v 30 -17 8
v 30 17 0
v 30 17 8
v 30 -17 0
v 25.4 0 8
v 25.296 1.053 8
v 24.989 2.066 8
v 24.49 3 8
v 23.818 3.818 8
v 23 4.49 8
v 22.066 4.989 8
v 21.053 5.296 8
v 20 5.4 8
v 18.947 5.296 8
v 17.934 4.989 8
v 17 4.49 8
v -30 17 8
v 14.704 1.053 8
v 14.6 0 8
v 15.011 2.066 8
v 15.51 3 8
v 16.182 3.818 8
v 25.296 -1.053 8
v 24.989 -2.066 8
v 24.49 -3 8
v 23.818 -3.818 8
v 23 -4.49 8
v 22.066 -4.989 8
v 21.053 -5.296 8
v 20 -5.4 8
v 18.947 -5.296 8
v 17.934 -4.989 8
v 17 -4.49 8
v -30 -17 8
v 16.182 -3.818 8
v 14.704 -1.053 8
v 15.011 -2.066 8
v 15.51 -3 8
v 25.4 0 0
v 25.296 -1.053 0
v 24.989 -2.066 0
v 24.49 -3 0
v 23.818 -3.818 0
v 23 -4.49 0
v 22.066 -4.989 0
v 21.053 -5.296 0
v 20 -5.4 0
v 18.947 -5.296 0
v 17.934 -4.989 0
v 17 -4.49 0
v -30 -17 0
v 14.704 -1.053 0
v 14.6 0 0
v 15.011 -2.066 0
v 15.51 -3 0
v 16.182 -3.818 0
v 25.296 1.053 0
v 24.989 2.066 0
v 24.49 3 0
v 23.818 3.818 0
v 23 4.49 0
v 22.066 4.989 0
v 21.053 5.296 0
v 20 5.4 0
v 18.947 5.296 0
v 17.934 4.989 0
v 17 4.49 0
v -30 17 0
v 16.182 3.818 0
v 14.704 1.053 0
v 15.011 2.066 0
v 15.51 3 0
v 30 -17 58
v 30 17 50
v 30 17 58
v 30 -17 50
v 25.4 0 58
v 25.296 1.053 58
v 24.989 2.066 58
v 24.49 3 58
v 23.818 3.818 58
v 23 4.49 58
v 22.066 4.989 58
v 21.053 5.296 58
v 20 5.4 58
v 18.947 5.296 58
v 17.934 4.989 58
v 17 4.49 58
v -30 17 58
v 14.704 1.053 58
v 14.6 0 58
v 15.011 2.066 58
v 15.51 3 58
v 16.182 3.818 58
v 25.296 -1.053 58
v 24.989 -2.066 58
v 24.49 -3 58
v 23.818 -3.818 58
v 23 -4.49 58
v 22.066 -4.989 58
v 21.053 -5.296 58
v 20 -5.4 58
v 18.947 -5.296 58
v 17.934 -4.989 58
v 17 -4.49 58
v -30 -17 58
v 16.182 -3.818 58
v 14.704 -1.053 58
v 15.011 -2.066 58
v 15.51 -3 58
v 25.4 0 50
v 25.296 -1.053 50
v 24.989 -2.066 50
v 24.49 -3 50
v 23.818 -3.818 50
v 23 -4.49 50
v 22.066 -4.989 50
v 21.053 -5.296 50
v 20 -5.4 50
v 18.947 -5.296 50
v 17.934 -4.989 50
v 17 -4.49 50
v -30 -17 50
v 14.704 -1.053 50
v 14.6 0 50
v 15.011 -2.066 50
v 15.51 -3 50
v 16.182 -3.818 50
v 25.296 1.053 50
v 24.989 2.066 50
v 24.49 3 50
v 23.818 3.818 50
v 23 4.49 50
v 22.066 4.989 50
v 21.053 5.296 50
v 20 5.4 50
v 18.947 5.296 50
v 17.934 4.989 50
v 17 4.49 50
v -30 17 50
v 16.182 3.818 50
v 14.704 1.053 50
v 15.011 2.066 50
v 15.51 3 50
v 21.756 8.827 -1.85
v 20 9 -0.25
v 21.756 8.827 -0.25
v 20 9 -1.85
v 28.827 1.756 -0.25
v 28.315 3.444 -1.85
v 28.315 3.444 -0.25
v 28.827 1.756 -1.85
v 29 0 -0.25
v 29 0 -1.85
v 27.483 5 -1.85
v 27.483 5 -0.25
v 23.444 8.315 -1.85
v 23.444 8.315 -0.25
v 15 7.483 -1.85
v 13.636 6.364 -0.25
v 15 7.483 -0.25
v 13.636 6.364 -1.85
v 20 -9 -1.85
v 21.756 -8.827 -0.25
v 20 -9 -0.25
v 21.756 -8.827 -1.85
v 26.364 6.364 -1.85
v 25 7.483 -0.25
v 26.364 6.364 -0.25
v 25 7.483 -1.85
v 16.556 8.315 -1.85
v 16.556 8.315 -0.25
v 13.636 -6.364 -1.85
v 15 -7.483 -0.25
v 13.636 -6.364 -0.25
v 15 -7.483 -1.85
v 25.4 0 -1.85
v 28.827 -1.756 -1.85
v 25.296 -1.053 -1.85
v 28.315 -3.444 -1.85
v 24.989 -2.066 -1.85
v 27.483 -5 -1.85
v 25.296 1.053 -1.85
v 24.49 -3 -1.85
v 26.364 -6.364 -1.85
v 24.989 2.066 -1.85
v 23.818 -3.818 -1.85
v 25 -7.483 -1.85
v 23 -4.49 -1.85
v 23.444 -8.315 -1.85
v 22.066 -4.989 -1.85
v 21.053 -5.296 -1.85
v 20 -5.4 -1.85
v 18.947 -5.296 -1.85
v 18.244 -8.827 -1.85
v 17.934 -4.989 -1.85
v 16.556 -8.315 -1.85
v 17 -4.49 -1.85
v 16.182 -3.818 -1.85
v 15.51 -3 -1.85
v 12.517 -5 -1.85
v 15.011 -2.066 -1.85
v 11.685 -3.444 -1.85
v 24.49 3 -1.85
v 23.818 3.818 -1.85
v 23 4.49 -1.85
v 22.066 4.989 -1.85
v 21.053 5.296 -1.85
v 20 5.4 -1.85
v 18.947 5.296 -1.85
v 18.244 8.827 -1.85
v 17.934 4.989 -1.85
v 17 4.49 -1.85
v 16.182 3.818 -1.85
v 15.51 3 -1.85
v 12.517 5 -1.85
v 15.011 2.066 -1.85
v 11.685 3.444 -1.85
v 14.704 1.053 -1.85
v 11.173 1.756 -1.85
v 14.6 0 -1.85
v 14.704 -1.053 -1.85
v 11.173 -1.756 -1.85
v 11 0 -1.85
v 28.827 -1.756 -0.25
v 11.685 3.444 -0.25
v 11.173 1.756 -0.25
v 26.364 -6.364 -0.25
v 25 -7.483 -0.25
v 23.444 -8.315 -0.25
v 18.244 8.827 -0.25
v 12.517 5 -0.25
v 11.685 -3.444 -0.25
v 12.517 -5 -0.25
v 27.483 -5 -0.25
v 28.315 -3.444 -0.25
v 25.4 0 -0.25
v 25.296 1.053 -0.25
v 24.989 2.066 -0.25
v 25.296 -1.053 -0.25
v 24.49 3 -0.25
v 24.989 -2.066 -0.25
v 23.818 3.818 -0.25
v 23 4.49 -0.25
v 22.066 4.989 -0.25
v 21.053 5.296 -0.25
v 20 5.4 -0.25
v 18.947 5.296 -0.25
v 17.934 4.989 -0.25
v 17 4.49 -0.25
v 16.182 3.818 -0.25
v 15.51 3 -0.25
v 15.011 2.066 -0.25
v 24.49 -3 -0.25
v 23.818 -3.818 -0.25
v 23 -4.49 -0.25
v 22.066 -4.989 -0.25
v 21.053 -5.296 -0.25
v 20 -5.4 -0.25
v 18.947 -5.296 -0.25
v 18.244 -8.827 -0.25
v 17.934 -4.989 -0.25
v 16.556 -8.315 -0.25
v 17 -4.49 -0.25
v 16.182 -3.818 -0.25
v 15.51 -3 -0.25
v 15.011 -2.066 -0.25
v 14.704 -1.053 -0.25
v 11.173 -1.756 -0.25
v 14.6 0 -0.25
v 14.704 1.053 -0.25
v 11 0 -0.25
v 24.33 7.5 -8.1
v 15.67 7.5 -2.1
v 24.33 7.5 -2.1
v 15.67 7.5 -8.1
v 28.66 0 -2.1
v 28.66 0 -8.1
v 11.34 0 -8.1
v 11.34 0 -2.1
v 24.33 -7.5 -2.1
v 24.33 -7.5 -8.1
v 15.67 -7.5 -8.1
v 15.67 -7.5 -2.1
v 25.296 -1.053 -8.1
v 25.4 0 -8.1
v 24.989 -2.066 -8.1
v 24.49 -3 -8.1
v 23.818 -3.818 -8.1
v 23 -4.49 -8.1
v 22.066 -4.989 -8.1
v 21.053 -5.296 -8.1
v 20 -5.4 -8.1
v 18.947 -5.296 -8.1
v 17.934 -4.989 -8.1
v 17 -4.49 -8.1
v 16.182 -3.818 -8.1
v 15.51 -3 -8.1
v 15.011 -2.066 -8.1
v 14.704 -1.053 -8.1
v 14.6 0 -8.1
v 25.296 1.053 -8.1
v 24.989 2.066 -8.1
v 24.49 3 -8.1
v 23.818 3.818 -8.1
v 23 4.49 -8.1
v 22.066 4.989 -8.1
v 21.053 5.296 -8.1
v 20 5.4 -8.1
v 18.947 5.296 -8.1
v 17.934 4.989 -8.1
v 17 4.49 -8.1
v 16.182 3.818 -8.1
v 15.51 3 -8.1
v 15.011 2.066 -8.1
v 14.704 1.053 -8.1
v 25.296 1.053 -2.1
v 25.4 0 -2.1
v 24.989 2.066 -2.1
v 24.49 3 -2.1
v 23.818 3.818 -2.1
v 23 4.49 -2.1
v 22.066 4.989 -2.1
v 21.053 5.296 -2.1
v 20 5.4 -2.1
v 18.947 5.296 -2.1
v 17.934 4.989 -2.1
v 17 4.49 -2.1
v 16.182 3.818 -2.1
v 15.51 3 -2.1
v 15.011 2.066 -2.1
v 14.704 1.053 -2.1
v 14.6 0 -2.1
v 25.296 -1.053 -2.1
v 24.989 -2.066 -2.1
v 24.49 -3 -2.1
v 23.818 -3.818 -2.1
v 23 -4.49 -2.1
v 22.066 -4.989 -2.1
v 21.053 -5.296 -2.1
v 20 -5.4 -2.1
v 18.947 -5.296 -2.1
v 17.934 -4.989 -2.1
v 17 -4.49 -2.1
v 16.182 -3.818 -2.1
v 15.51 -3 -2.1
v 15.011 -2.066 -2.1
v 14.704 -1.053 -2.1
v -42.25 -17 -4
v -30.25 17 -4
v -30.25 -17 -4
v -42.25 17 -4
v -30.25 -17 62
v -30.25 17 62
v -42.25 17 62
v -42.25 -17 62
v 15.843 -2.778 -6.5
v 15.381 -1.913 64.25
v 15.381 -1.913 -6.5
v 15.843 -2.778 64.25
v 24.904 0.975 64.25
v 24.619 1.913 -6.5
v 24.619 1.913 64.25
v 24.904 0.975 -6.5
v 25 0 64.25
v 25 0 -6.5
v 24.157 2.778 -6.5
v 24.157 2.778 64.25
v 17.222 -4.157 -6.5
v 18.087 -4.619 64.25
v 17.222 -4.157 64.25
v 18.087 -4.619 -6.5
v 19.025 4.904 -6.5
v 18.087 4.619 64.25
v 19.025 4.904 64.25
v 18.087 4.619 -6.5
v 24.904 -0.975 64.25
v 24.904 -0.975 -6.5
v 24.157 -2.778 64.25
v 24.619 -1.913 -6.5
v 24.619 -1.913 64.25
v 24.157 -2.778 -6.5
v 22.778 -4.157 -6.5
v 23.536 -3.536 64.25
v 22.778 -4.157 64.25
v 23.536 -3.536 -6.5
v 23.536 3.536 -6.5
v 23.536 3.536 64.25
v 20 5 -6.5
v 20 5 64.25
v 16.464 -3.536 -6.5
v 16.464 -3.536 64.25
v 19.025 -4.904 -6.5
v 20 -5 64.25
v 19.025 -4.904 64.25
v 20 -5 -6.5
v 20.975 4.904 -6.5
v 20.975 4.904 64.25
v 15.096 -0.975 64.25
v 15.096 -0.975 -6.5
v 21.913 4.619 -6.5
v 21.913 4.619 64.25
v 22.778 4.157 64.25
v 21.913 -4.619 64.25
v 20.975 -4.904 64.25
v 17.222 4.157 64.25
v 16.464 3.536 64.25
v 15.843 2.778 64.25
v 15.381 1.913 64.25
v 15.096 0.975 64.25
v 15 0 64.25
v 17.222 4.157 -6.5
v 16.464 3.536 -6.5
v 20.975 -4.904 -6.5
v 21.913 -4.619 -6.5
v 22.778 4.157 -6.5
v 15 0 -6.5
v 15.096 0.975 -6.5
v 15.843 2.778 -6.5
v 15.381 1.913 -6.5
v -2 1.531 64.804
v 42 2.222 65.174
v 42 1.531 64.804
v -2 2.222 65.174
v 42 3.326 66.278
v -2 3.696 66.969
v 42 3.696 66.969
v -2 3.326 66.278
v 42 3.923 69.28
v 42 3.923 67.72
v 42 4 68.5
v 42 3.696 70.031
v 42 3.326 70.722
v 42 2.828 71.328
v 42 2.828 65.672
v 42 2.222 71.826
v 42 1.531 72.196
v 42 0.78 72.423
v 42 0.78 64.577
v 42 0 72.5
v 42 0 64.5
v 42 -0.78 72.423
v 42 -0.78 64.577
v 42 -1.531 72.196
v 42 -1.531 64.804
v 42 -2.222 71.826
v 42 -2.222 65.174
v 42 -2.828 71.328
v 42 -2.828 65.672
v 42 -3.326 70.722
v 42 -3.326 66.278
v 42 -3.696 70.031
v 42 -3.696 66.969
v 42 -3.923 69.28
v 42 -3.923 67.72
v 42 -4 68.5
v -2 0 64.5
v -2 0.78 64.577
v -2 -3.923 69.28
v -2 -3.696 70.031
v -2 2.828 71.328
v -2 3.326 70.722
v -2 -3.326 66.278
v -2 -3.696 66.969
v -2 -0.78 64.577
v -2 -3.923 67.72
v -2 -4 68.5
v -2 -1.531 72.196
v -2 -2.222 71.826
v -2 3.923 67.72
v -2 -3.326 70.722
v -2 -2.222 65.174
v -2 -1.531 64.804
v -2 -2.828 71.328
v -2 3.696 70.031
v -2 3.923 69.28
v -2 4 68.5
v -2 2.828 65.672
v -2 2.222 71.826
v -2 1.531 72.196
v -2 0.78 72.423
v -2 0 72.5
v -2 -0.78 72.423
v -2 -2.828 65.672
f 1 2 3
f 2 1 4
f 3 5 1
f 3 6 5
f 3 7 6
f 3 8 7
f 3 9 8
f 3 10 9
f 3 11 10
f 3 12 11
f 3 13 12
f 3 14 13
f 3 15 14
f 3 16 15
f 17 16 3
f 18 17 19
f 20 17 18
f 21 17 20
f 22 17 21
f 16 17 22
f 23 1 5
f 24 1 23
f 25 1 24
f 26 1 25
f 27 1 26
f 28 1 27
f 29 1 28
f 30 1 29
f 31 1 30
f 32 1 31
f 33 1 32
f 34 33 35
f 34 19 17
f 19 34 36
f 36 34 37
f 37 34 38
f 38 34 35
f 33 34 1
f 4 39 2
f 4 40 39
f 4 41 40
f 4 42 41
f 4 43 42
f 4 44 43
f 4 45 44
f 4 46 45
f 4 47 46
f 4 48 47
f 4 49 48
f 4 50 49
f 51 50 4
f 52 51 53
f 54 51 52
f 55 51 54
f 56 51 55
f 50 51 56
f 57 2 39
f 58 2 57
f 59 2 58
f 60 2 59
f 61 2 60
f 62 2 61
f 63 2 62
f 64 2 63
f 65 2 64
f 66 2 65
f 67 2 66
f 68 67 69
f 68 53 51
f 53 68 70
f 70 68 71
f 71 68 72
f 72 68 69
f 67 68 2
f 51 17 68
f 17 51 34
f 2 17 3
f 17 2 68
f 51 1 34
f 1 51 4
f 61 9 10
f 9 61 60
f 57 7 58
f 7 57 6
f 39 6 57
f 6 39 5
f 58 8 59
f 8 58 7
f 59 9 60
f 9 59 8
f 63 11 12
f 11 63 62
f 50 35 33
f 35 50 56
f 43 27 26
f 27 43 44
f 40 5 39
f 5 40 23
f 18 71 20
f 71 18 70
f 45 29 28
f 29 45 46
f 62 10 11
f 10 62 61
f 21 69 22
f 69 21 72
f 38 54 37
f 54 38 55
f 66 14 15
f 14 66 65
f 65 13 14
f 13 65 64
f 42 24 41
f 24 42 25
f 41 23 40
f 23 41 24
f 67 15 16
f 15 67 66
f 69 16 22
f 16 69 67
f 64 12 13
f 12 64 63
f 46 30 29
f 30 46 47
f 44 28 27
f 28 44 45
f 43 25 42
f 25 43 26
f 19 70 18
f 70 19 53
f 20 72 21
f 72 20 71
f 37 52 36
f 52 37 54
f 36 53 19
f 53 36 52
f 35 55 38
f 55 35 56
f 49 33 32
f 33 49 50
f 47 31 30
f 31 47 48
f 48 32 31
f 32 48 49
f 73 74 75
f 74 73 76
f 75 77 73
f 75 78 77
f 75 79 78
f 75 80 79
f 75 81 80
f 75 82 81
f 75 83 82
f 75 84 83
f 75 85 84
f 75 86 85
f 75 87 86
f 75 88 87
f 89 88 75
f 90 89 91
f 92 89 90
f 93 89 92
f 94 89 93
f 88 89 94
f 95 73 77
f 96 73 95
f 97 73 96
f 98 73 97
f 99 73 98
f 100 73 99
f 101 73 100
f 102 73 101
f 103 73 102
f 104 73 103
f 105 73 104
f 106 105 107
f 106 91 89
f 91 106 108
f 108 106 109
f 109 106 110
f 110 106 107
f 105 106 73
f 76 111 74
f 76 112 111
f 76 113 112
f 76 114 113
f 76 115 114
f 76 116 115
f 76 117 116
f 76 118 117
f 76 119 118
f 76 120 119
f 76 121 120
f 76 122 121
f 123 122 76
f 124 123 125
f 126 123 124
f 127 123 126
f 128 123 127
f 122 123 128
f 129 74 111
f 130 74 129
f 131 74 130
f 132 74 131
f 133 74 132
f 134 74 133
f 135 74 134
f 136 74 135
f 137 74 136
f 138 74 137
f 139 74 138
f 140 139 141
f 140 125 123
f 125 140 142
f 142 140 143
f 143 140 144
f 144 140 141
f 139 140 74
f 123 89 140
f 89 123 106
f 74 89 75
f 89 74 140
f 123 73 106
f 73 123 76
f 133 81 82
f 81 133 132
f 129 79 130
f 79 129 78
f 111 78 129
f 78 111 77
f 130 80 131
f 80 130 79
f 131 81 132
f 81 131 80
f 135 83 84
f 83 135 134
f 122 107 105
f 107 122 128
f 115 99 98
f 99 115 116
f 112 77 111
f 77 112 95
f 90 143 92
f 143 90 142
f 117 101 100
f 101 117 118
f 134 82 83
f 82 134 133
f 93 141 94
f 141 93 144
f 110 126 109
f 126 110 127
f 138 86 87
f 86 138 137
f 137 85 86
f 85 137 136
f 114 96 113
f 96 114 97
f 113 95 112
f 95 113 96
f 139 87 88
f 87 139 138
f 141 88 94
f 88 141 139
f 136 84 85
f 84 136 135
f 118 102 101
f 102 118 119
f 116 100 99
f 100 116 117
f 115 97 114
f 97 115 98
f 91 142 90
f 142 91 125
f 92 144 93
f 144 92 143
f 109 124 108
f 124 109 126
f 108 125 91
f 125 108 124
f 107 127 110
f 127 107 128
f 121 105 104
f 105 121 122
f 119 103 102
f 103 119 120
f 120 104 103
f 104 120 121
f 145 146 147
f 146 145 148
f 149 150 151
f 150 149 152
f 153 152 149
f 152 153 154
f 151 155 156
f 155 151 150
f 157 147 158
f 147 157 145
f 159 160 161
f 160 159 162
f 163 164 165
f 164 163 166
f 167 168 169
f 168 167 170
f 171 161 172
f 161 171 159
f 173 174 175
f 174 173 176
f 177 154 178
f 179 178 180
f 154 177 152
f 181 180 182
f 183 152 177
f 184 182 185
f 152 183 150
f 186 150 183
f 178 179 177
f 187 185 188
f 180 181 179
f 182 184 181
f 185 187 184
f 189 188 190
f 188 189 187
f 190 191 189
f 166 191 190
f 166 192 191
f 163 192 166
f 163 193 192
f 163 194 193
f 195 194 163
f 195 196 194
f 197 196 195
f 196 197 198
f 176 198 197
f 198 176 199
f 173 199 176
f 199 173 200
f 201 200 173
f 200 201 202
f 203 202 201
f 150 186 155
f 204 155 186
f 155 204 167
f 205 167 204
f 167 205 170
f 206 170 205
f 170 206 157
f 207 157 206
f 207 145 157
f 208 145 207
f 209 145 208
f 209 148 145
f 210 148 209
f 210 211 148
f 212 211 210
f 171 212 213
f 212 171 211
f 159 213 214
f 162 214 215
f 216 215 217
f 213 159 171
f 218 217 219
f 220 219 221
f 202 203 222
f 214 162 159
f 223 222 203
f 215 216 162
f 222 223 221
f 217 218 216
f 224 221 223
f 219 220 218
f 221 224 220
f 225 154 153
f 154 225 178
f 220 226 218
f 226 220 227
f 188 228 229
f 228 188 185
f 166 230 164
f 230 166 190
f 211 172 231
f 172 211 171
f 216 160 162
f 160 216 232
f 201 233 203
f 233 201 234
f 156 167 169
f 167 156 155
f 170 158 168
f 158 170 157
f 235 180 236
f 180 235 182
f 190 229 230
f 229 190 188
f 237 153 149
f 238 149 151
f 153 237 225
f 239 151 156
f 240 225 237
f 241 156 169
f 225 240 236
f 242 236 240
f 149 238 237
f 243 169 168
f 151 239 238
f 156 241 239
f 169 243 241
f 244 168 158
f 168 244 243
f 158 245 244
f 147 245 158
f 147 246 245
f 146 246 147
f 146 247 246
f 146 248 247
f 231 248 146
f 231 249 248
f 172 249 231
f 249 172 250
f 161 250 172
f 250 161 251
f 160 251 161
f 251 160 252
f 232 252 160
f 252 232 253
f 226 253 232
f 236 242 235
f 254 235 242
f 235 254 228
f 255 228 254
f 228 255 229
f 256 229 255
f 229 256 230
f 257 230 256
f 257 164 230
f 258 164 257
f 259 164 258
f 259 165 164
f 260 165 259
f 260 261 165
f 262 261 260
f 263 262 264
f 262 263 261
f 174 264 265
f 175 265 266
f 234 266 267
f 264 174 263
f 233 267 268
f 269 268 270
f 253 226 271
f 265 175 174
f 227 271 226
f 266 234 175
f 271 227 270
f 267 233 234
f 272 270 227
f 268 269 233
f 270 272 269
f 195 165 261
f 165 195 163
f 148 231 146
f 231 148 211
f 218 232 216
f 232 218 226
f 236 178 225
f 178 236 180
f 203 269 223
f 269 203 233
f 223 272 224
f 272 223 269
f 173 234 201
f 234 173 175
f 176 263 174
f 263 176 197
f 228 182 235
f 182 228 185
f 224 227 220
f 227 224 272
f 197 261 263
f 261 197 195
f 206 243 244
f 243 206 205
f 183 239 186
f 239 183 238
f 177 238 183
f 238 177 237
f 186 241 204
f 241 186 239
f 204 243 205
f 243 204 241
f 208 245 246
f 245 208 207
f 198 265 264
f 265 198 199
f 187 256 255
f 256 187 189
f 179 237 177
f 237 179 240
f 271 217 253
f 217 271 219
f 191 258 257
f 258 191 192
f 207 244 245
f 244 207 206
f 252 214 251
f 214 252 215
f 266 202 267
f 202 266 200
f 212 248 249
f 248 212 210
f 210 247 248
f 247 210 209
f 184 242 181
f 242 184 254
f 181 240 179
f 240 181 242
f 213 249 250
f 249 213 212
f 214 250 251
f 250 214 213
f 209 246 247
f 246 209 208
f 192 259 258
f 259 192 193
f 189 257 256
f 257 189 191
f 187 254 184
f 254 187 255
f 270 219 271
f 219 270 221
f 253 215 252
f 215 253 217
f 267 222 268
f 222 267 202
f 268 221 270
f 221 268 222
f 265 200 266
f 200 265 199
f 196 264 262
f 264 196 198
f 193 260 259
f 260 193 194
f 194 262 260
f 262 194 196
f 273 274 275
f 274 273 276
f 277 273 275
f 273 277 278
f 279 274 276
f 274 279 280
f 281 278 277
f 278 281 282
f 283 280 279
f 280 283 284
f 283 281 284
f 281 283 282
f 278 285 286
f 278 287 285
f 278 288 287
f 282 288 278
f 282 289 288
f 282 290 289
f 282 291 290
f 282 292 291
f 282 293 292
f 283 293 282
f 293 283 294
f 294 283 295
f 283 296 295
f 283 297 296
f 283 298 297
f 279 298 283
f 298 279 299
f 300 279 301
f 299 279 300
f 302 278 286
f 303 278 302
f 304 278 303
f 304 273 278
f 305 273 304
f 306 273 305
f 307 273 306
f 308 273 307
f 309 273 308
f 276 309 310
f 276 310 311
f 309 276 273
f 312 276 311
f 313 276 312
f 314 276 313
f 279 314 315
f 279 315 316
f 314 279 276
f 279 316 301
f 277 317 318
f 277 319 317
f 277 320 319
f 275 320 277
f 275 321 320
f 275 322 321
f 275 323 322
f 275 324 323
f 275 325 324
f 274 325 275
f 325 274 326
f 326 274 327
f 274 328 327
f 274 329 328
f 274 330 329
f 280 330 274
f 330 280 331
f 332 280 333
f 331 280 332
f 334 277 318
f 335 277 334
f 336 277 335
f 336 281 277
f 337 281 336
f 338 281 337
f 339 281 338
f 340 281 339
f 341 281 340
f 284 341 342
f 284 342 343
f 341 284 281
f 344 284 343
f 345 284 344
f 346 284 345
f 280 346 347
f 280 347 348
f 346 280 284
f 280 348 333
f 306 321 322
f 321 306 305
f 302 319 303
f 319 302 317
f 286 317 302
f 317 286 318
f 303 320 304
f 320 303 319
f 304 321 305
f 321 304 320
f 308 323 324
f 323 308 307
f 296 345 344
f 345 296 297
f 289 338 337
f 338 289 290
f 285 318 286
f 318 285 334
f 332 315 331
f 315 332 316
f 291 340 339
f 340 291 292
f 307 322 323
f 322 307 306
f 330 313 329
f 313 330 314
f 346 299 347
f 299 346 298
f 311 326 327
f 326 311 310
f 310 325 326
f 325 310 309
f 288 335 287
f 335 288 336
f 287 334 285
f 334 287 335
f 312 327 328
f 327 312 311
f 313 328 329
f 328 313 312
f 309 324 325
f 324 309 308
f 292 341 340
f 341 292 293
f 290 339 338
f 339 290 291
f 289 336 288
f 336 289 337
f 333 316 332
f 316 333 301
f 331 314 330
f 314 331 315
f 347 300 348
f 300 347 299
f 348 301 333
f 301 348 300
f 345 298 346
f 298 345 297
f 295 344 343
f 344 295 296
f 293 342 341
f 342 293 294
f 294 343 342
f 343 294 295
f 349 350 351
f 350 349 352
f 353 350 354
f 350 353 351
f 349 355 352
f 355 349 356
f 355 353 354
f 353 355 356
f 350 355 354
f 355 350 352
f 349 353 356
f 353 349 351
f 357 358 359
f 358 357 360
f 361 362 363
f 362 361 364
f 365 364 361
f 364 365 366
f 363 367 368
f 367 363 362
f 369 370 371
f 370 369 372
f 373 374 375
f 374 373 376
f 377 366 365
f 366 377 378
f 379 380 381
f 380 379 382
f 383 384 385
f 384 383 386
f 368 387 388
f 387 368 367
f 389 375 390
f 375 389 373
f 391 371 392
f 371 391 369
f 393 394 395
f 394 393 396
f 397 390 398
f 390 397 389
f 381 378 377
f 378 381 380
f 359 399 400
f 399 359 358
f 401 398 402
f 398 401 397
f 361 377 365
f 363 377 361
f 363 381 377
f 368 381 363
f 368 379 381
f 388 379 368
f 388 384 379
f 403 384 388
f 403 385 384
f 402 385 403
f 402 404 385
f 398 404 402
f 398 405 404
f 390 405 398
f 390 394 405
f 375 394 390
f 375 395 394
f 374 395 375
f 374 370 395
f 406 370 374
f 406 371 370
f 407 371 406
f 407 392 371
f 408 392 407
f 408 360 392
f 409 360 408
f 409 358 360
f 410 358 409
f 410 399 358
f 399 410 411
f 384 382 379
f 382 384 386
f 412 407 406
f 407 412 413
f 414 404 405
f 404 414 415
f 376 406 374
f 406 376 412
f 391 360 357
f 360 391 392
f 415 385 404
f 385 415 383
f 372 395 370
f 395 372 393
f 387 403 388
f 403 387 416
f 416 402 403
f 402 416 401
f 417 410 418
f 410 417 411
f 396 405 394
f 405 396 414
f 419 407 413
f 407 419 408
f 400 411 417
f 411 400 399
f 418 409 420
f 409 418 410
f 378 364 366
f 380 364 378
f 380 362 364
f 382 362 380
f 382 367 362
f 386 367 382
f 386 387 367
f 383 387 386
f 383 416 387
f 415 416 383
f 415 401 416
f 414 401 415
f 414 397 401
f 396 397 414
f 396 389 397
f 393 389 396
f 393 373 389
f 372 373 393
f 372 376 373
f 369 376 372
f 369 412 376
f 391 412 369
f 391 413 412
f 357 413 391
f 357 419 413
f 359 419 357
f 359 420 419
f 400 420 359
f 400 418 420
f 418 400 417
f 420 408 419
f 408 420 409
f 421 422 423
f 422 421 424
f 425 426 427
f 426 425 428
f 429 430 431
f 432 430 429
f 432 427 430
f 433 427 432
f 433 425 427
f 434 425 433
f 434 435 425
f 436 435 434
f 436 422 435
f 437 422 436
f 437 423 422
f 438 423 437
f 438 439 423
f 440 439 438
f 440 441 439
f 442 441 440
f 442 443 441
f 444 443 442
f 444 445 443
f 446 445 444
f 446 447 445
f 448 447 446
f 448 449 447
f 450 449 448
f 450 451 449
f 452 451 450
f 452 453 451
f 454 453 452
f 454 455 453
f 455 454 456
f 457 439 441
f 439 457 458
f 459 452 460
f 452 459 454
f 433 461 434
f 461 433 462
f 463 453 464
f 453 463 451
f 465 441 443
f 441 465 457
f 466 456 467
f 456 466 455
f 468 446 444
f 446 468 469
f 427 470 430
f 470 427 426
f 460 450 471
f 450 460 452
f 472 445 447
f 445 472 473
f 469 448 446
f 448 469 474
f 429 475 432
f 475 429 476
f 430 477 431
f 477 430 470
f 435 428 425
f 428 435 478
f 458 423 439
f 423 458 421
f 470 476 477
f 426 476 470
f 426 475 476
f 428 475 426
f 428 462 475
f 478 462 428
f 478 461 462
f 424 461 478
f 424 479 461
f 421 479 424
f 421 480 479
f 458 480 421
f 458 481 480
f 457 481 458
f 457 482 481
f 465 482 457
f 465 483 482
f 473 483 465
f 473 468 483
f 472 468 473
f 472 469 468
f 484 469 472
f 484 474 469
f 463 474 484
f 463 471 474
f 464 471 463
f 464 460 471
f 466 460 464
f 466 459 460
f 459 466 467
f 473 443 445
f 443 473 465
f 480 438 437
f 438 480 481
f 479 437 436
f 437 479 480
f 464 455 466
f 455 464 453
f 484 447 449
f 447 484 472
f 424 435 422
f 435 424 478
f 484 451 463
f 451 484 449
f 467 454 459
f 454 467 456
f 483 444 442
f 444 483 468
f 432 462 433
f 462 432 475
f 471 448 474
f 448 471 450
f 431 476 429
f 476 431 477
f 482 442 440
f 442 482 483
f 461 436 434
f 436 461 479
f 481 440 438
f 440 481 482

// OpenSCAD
$fn = 32;

// ------------------------------------------------------------------------
// C clamp: throat 50 mm, screw d10
// Every part is its own module, assembly() places every instance.
// ------------------------------------------------------------------------

// --- part 1 ---
module clamp_arm() {
  difference() {
    translate([-30, -17, 0]) cube([60, 34, 8]);
    translate([20, 0, -1]) cylinder(h = 10, d = 10.8);
  }
}

// --- part 2 ---
module clamp_spine() {
  difference() {
    translate([-33, -17, 0]) cube([66, 34, 12]);
  }
}

// --- part 3 ---
module clamp_screw() {
  translate([0, 0, -35.375]) cylinder(h = 70.75, d = 10);
}

// --- part 4 ---
module clamp_washer() {
  difference() {
      translate([0, 0, 0]) cylinder(h = 1.6, d = 18);
      translate([0, 0, -1]) cylinder(h = 3.6, d = 10.8);
    }
}

// --- part 5 ---
module clamp_nut() {
  difference() {
    linear_extrude(height = 6) polygon(points = [[8.66, 0], [4.33, 7.5], [-4.33, 7.5], [-8.66, 0], [-4.33, -7.5], [4.33, -7.5]]);
    translate([0, 0, -1]) cylinder(h = 8, d = 10.8);
  }
}

// --- part 6 ---
module tommy_bar() {
  translate([0, 0, -22]) cylinder(h = 44, d = 8);
}

// --- assembly ---
module assembly() {
  color([0.80, 0.24, 0.20]) translate([0, 0, 0]) rotate([0, 0, 0]) clamp_arm();
  color([0.20, 0.45, 0.75]) translate([0, 0, 50]) rotate([0, 0, 0]) clamp_arm();
  color([0.25, 0.62, 0.32]) translate([-42.25, 0, 29]) rotate([0, 90, 0]) clamp_spine();
  color([0.92, 0.70, 0.18]) translate([20, 0, 28.875]) rotate([0, 0, 0]) clamp_screw();
  color([0.58, 0.35, 0.70]) translate([20, 0, -1.85]) rotate([0, 0, 0]) clamp_washer();
  color([0.16, 0.66, 0.66]) translate([20, 0, -8.1]) rotate([0, 0, 0]) clamp_nut();
  color([0.85, 0.48, 0.18]) translate([20, 0, 68.5]) rotate([0, 90, 0]) tommy_bar();
}

assembly();
